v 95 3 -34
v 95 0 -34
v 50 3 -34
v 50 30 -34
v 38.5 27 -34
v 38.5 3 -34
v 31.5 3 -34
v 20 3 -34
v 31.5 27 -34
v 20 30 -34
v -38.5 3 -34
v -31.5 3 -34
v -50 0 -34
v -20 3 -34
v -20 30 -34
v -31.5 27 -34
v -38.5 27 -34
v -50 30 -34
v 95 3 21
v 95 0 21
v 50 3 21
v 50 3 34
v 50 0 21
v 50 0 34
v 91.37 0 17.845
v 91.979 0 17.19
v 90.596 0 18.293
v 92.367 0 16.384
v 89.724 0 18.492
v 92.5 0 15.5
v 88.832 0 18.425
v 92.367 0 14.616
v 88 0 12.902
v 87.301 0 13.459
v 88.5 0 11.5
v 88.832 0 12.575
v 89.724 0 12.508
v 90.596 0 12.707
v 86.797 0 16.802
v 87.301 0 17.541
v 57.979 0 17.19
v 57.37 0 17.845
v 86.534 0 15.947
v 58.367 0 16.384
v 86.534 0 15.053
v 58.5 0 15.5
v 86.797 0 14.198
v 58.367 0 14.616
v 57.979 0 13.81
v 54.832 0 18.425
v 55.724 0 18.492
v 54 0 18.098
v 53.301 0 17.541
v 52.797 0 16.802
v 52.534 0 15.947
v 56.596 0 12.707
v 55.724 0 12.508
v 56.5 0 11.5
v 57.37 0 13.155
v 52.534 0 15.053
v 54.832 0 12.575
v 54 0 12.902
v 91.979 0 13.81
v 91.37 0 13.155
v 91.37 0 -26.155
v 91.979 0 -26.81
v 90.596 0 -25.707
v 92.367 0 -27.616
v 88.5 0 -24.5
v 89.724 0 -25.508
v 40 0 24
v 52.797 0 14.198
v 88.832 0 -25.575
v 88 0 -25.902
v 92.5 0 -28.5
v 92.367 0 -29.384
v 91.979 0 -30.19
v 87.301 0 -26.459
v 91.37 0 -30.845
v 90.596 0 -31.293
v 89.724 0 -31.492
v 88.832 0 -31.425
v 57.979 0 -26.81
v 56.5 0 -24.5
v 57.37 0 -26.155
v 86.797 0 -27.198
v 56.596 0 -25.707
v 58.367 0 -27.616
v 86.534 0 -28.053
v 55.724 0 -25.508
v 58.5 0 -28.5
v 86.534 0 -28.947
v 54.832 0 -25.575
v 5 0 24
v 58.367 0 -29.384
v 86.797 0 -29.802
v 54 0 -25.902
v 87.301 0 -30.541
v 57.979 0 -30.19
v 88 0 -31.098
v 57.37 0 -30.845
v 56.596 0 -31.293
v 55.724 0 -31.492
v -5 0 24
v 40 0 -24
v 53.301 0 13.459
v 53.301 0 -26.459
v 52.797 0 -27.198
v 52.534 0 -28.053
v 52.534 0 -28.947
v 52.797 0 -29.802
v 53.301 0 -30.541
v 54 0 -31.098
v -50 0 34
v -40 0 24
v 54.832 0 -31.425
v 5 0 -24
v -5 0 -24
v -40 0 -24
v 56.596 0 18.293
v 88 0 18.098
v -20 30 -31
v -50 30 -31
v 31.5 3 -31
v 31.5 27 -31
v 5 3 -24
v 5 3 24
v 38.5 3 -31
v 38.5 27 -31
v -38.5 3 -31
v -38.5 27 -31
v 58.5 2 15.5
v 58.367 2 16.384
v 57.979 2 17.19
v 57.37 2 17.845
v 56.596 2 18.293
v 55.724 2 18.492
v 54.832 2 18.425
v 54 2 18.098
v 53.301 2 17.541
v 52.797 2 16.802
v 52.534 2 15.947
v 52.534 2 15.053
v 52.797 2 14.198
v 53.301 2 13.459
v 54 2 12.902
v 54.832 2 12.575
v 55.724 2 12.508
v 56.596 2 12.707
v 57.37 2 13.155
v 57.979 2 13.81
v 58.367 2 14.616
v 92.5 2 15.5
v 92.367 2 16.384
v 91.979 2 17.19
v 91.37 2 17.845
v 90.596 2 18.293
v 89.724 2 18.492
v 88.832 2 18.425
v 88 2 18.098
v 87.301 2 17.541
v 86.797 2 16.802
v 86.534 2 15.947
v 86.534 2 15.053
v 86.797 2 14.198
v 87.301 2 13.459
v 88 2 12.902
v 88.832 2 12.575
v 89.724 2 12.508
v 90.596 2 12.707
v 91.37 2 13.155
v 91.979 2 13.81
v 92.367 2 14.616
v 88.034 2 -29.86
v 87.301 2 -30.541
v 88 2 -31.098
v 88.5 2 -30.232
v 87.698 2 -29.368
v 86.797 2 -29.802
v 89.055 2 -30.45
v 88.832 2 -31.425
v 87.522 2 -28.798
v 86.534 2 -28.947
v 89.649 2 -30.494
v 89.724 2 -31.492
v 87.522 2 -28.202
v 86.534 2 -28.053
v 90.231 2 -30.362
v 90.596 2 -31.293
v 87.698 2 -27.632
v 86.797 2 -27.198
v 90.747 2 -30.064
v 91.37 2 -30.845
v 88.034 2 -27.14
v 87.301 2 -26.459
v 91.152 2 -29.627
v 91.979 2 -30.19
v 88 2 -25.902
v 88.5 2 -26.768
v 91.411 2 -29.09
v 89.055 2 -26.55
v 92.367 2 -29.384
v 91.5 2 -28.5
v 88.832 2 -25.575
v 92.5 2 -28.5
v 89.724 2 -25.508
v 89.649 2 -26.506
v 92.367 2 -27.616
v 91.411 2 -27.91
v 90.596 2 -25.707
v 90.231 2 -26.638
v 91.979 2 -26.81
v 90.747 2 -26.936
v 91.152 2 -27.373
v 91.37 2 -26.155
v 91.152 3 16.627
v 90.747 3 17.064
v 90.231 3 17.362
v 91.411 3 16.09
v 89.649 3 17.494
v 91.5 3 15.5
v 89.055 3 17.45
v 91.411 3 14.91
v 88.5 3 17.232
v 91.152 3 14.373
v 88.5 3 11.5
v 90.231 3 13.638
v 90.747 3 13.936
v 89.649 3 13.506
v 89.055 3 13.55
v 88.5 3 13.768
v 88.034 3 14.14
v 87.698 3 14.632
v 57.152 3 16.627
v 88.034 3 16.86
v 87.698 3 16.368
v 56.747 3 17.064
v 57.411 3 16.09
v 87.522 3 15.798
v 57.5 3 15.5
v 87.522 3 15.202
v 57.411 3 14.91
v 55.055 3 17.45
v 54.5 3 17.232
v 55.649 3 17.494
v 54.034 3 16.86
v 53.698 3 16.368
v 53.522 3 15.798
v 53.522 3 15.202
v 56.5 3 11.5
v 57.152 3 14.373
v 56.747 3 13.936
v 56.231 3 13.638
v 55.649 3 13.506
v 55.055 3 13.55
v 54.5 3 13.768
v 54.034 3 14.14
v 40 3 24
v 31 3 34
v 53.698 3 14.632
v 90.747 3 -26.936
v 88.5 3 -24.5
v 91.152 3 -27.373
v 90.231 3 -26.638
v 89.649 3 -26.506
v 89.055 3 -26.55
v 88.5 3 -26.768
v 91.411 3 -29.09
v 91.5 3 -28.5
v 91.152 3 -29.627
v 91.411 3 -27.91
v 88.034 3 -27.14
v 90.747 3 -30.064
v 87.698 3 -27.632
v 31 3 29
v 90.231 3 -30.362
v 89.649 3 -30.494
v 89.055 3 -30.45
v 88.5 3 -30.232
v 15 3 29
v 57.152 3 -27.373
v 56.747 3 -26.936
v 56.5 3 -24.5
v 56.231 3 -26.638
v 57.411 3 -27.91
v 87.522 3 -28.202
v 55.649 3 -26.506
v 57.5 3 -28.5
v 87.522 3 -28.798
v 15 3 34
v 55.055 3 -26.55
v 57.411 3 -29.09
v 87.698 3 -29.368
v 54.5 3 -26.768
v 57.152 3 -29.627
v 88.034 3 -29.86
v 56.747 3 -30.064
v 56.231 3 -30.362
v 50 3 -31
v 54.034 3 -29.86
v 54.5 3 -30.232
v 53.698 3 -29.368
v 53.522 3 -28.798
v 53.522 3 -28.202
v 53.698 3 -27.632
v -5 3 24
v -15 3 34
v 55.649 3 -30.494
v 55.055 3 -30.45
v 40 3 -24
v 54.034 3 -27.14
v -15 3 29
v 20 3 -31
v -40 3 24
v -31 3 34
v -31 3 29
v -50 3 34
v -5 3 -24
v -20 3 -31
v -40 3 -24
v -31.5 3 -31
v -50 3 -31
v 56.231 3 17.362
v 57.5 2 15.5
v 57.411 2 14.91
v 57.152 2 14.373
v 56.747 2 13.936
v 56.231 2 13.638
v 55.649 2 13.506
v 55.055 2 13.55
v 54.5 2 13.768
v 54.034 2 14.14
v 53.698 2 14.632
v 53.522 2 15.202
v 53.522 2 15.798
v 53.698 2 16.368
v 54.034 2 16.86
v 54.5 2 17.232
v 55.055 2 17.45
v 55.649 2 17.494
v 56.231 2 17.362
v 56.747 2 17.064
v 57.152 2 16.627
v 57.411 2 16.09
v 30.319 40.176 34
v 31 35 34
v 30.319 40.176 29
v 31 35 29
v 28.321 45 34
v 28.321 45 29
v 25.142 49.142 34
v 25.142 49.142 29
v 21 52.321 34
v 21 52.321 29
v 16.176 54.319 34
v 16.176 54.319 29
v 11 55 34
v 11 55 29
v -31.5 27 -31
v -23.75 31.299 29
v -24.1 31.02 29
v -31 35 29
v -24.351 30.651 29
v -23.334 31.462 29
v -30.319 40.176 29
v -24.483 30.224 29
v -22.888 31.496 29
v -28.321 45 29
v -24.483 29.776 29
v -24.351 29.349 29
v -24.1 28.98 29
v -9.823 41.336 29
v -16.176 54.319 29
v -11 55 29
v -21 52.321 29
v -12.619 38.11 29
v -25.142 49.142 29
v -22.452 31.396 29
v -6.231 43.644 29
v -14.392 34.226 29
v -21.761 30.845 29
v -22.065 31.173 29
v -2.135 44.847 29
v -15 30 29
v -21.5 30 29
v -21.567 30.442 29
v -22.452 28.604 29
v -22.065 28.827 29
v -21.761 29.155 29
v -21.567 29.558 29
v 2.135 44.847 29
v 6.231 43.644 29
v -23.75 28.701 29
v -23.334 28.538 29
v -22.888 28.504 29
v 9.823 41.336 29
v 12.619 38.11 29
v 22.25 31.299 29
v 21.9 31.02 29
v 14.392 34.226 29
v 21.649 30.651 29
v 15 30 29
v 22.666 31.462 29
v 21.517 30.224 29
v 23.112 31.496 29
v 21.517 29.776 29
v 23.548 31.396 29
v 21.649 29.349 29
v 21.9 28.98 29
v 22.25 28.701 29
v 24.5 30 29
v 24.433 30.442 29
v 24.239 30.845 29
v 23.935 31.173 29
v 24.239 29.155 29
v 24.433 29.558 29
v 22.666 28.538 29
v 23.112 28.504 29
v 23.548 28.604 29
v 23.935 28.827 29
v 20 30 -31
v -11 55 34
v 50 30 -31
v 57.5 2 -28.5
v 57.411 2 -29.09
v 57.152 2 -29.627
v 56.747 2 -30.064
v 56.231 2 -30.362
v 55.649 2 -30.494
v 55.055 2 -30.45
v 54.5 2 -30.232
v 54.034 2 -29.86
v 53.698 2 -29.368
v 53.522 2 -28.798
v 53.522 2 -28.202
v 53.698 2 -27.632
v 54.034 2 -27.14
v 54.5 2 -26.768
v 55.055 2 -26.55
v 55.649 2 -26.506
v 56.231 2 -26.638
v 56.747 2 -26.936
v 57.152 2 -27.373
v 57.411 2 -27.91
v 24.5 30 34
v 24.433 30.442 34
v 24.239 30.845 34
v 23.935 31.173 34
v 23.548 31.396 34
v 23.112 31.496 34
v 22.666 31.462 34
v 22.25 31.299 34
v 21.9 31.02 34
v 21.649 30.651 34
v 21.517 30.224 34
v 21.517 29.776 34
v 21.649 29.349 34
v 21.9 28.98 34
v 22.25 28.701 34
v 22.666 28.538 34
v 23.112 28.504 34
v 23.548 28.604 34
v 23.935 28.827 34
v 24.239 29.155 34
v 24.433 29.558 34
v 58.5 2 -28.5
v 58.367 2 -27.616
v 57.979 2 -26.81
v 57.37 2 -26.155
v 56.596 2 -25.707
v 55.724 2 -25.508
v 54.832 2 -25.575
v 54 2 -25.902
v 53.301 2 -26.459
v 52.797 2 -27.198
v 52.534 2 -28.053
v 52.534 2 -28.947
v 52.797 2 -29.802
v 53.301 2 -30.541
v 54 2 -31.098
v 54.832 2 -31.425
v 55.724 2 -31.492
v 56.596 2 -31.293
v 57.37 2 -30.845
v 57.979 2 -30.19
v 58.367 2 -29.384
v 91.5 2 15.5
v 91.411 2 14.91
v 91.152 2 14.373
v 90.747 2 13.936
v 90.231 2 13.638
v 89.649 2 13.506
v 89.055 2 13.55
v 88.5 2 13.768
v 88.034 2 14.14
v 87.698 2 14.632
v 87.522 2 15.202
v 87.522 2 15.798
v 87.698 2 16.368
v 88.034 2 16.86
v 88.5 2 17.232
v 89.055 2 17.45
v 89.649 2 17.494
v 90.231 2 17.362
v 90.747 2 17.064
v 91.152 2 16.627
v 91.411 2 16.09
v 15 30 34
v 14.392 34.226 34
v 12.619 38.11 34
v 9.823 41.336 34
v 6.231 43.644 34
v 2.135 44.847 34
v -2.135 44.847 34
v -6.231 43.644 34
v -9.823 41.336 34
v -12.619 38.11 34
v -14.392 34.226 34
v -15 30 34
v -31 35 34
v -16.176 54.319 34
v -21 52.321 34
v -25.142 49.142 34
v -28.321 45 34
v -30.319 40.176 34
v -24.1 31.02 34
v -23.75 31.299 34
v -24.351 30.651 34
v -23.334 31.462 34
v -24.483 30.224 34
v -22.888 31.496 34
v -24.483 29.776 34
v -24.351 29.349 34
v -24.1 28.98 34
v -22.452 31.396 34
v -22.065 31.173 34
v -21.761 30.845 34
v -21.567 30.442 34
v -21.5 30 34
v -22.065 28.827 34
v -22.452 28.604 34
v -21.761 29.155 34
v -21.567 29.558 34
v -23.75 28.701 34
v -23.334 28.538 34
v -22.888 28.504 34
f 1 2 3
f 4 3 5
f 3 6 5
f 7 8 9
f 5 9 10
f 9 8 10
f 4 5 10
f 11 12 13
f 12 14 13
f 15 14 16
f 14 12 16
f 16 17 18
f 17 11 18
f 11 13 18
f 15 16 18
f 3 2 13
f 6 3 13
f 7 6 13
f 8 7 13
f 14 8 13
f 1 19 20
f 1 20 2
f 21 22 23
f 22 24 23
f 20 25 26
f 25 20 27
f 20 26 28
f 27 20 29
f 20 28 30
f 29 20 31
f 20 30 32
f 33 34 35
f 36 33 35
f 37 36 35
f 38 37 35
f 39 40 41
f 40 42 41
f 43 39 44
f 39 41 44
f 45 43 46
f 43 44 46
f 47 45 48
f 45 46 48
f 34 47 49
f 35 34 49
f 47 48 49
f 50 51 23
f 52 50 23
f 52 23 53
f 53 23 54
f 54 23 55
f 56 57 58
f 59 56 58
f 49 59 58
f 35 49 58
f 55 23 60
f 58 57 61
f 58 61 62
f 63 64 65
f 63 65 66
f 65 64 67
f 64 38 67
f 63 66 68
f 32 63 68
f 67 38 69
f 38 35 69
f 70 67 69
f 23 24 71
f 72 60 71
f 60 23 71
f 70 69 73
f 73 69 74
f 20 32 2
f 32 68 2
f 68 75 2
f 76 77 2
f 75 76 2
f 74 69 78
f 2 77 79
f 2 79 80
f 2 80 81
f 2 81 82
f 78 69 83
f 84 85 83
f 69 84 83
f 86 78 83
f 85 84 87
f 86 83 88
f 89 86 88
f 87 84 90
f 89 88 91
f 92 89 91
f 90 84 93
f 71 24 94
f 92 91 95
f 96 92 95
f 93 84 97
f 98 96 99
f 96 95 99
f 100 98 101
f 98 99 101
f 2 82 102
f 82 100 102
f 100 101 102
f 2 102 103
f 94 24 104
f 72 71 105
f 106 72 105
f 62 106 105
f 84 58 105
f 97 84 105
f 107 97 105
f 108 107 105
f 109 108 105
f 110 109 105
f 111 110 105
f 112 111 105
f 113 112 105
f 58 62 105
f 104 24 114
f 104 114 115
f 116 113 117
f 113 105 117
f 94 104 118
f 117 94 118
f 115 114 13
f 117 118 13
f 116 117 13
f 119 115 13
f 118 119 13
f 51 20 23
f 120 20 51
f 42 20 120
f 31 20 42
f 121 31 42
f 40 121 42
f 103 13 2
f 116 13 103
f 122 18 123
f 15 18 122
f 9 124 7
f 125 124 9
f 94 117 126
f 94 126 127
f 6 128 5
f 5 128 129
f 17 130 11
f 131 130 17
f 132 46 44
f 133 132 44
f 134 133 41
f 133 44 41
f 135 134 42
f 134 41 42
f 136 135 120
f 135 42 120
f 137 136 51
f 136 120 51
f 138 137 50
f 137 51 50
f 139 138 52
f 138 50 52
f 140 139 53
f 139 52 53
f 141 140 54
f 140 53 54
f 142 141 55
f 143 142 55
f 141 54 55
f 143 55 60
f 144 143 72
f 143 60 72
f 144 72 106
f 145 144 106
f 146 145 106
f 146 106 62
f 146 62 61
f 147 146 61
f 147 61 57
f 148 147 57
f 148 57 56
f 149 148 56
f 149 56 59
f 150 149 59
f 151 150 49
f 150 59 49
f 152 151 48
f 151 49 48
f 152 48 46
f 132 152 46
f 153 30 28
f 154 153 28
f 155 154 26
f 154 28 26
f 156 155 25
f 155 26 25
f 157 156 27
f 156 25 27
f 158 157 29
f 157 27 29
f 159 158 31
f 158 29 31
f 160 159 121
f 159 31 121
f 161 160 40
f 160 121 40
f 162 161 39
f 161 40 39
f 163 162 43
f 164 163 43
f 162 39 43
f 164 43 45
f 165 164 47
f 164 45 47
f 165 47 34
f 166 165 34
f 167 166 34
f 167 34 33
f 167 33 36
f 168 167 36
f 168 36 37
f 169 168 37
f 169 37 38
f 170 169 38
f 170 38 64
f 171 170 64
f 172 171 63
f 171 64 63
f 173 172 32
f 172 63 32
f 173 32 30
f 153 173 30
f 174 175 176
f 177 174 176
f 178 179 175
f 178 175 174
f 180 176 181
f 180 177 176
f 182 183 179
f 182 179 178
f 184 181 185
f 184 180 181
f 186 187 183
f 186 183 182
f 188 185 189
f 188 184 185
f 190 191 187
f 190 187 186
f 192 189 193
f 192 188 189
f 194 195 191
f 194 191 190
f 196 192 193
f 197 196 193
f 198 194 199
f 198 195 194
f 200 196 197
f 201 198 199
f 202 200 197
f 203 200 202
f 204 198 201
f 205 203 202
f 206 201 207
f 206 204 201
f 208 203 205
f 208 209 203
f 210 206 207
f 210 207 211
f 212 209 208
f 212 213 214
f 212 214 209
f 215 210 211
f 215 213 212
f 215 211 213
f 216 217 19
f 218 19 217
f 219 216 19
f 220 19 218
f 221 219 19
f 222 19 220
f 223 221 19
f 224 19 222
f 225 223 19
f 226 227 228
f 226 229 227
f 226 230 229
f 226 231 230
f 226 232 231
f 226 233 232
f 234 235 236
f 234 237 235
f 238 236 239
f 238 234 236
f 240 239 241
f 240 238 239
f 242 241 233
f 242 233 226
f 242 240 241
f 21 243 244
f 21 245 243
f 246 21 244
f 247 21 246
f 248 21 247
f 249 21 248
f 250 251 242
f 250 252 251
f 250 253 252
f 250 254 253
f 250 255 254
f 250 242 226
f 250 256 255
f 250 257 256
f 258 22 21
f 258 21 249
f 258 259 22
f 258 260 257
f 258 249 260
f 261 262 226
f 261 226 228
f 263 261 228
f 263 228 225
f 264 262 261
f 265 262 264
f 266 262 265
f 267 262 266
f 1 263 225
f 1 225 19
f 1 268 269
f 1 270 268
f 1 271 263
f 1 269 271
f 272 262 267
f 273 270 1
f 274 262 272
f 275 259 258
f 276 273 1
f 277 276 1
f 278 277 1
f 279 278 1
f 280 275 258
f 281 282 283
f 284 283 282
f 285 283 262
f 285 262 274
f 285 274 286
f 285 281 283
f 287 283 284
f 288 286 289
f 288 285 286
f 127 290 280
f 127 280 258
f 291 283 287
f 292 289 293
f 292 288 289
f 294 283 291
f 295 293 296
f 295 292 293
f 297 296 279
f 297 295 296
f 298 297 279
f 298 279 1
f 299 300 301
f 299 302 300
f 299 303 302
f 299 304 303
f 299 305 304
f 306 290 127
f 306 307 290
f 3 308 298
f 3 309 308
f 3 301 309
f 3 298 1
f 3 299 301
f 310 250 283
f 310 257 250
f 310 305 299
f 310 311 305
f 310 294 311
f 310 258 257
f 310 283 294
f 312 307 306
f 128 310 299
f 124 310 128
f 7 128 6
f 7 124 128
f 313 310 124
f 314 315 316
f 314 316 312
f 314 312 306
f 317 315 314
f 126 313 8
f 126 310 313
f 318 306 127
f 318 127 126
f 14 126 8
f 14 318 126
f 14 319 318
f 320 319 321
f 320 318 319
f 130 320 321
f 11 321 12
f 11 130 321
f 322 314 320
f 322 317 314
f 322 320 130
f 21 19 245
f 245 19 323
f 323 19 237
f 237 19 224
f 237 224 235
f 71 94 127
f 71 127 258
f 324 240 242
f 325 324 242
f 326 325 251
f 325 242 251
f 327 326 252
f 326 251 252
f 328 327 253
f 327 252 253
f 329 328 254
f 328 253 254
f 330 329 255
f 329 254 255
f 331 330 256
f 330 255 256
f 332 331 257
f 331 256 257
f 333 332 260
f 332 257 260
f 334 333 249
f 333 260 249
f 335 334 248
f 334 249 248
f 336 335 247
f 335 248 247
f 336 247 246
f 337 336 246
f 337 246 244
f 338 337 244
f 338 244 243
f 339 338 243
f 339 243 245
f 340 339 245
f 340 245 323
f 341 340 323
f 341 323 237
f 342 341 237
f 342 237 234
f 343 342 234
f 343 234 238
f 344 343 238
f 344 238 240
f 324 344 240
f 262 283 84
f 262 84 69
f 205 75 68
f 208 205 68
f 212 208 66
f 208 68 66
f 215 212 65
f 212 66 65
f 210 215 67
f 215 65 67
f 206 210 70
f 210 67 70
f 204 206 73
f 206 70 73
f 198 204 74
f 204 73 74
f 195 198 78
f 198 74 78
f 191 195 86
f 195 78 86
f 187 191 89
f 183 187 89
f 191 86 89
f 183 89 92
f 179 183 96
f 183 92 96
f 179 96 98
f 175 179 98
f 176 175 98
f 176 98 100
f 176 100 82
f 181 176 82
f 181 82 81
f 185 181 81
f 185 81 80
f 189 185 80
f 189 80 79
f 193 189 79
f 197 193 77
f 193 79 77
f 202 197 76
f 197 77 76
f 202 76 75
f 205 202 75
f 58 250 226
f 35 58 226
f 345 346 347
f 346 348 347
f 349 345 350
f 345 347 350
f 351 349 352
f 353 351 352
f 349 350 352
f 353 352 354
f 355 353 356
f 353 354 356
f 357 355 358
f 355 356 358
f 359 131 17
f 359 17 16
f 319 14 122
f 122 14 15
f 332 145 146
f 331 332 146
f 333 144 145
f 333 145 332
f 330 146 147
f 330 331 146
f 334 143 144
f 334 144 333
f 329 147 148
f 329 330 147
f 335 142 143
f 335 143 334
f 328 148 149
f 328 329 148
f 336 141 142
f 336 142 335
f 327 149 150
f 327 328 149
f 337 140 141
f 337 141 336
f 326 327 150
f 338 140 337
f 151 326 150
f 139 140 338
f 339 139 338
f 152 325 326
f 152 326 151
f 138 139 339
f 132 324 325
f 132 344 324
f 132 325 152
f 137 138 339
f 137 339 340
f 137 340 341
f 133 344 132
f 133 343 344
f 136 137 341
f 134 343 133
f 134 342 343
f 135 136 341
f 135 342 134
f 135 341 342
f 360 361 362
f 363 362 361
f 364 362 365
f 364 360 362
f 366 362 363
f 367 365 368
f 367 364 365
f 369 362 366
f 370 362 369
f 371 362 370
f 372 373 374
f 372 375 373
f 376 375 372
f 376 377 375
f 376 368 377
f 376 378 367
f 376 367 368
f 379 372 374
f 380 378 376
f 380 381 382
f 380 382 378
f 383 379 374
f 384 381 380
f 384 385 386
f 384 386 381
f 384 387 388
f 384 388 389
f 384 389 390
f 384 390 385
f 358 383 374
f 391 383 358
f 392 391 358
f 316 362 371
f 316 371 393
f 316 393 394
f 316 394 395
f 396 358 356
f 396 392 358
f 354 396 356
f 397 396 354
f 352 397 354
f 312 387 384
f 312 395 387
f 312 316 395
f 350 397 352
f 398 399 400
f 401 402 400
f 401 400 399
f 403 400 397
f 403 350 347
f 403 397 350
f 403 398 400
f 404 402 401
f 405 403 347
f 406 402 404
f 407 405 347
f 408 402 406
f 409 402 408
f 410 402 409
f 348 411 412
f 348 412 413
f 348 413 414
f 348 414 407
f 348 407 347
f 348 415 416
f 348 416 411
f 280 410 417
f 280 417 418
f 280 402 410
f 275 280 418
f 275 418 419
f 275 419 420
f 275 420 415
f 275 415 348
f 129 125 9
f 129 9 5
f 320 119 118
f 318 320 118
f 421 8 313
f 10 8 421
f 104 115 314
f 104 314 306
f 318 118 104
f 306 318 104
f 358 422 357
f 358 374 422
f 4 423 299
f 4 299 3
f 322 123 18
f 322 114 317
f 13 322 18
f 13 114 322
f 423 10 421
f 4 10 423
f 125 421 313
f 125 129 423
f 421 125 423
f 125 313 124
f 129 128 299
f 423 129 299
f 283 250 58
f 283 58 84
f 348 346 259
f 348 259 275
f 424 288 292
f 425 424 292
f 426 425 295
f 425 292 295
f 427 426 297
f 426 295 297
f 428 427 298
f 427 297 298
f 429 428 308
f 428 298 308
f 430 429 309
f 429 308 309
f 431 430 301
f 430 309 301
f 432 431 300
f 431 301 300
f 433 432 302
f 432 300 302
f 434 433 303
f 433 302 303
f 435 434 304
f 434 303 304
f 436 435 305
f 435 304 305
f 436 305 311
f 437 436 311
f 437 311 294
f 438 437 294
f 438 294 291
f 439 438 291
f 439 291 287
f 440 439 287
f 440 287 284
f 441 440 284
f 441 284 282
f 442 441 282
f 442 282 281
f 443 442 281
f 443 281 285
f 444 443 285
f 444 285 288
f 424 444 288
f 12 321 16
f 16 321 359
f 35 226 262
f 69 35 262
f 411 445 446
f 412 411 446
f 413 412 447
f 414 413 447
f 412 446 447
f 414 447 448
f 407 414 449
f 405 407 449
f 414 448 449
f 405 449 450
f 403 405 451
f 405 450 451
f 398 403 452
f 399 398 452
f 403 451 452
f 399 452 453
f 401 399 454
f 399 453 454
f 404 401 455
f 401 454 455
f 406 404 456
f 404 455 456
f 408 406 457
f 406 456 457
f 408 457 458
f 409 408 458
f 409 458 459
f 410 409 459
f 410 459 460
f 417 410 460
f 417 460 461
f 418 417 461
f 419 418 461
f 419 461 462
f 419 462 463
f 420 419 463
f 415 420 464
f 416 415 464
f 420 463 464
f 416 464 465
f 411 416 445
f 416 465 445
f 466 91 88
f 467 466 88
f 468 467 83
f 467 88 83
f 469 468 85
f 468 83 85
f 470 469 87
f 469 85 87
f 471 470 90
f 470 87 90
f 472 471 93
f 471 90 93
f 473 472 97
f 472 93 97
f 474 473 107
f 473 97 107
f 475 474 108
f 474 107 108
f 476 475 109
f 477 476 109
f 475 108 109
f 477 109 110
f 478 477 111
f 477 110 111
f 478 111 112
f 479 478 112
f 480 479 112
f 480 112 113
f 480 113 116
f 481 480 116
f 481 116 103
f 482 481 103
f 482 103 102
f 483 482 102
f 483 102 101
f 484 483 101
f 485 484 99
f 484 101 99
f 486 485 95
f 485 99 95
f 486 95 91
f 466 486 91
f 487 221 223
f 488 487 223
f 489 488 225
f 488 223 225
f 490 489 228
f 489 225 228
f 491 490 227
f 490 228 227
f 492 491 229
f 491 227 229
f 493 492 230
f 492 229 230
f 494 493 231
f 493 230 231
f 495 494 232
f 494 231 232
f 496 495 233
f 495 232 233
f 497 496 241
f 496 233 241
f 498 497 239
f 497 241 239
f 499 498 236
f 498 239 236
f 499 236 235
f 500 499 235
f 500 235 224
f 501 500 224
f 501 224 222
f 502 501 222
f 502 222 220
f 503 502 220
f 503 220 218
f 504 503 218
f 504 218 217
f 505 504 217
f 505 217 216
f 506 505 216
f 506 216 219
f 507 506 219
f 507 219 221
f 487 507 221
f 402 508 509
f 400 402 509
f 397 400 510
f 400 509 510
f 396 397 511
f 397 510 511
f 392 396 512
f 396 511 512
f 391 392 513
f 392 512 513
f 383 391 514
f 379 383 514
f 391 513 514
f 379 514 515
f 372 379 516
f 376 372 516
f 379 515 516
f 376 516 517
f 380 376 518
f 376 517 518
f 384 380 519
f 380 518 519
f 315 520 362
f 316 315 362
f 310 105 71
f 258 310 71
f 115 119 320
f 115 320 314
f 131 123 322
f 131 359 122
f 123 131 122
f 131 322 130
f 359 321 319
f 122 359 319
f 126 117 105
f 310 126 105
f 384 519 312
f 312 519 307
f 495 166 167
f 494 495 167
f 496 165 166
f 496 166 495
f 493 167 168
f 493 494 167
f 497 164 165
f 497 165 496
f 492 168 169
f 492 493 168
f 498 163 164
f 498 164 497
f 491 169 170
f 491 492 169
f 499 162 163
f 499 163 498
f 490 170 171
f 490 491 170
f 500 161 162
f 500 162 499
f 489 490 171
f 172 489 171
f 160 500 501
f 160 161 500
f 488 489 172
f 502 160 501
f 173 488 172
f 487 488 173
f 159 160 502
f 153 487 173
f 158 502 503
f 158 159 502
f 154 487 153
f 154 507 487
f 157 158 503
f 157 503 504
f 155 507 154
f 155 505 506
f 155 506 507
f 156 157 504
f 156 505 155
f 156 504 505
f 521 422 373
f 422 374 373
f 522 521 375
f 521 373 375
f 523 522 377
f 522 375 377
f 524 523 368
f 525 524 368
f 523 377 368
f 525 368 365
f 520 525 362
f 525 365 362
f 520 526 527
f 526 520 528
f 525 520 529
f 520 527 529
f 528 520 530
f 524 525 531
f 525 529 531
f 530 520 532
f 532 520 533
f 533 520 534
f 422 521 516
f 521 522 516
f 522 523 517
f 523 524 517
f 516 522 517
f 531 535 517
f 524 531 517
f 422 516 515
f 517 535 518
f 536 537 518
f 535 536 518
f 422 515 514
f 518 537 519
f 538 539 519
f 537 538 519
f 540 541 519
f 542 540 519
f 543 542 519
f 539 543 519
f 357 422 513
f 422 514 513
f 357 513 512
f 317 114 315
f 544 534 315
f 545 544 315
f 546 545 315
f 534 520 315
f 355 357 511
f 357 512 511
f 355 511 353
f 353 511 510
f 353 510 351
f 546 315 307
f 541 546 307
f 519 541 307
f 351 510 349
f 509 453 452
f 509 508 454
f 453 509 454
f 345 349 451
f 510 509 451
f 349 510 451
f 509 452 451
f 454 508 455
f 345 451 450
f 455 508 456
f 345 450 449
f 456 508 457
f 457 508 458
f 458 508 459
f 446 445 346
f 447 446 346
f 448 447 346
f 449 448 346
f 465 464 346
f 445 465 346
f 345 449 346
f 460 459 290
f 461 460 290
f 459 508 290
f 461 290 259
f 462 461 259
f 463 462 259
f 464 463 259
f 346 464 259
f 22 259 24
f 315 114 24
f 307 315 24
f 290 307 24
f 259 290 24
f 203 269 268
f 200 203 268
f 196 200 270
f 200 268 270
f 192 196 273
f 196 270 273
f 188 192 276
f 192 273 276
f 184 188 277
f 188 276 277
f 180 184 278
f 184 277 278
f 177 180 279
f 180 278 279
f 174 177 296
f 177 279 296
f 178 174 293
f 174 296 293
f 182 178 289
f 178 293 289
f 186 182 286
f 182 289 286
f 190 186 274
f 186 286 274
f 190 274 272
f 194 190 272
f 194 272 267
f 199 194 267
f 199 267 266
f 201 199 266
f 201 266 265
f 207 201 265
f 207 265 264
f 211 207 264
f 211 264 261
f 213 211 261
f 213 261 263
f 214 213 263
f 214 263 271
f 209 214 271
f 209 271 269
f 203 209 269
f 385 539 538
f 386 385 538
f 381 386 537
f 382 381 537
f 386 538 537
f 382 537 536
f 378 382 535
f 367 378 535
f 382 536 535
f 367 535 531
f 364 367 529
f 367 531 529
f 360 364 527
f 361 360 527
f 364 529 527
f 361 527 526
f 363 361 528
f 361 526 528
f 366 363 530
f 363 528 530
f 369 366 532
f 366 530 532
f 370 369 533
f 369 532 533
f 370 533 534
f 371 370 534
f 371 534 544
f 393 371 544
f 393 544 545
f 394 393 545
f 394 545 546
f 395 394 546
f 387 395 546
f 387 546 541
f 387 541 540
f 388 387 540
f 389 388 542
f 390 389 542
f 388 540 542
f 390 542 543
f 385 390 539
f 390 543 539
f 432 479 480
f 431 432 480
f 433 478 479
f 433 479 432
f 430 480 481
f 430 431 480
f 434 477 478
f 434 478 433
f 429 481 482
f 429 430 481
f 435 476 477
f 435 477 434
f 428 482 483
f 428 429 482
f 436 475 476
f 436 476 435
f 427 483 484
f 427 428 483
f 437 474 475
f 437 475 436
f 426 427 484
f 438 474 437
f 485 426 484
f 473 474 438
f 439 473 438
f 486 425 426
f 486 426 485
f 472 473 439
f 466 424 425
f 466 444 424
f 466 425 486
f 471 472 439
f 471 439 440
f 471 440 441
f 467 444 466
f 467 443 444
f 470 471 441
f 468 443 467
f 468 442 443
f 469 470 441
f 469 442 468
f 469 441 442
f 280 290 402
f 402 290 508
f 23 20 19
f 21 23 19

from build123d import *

# Parameters (mm, degrees)
SKETCH_1_W          = 100
SKETCH_1_H          = 68
EXTRUDE_1_DEPTH     = 3
SKETCH_2_W          = 100
SKETCH_2_H          = 3
EXTRUDE_2_DEPTH     = 27
SKETCH_3_W          = 7
SKETCH_3_H          = 24
CUT_EXTRUDE_2_DEPTH = 27
SKETCH_4_W          = 62
SKETCH_4_H          = 5
EXTRUDE_3_DEPTH     = 52
SKETCH_5_R          = 1.5
CUT_EXTRUDE_4_DEPTH = 5
SKETCH_7_W          = 35
SKETCH_7_H          = 48
CUT_EXTRUDE_5_DEPTH = 3
SKETCH_8_W          = 55
SKETCH_8_H          = 3
EXTRUDE_4_DEPTH     = 45
SKETCH_10_R         = 2
SKETCH_10_W         = 32
SKETCH_10_H         = 36
CUT_EXTRUDE_6_DEPTH = 45
SKETCH_12_R         = 3
CUT_EXTRUDE_7_DEPTH = 2
SKETCH_13_W         = 40
SKETCH_13_H         = 27
CUT_EXTRUDE_8_DEPTH = 10
FILLET_1_R          = 20


with BuildPart() as part:
    # 스케치1 → 보스-돌출1 (new body)
    with BuildSketch(Plane(origin=(0, 0, 0), x_dir=(1, 0, 0), z_dir=(0, 1, 0))):
        Rectangle(SKETCH_1_W, SKETCH_1_H)
    extrude(amount=EXTRUDE_1_DEPTH)

    # 스케치2 → 보스-돌출2 (add)
    with BuildSketch(Plane(origin=(0, 3, 0), x_dir=(1, 0, 0), z_dir=(0, 1, 0))):
        with Locations((0, 32.5)):
            Rectangle(SKETCH_2_W, SKETCH_2_H)
    extrude(amount=EXTRUDE_2_DEPTH)

    # 스케치3 → 컷-돌출2 (cut)
    with BuildSketch(Plane.XY.offset(-31)):
        with Locations((-35, 15)):
            Rectangle(SKETCH_3_W, SKETCH_3_H)
        with Locations((35, 15)):
            Rectangle(SKETCH_3_W, SKETCH_3_H)
    extrude(amount=-CUT_EXTRUDE_2_DEPTH, mode=Mode.SUBTRACT)

    # 스케치4 → 보스-돌출3 (add)
    with BuildSketch(Plane(origin=(0, 3, 0), x_dir=(1, 0, 0), z_dir=(0, 1, 0))):
        with Locations((0, -31.5)):
            Rectangle(SKETCH_4_W, SKETCH_4_H)
    extrude(amount=EXTRUDE_3_DEPTH)

    # 스케치5 → 컷-돌출4 (cut)
    with BuildSketch(Plane.XY.offset(34)):
        with Locations((-23, 30)):
            Circle(SKETCH_5_R)
        with Locations((23, 30)):
            Circle(SKETCH_5_R)
        with BuildLine():
            Line((-15, 30), (-15, 3))
            Line((-15, 3), (15, 3))
            Line((15, 3), (15, 30))
            ThreePointArc((15, 30), (0, 45), (-15, 30))
        make_face()
    extrude(amount=-CUT_EXTRUDE_4_DEPTH, mode=Mode.SUBTRACT)

    # 스케치7 → 컷-돌출5 (cut)
    with BuildSketch(Plane.XZ):
        with Locations((22.5, 0)):
            Rectangle(SKETCH_7_W, SKETCH_7_H)
        with Locations((-22.5, 0)):
            Rectangle(SKETCH_7_W, SKETCH_7_H)
    extrude(amount=-CUT_EXTRUDE_5_DEPTH, mode=Mode.SUBTRACT)

    # 스케치8 → 보스-돌출4 (add)
    with BuildSketch(Plane(origin=(50, 0, 0), x_dir=(0, 0, -1), z_dir=(1, 0, 0))):
        with Locations((6.5, 1.5)):
            Rectangle(SKETCH_8_W, SKETCH_8_H)
    extrude(amount=EXTRUDE_4_DEPTH)

    # 스케치10 → 컷-돌출6 (cut)
    with BuildSketch(Plane(origin=(0, 3, 0), x_dir=(1, 0, 0), z_dir=(0, 1, 0))):
        with Locations((55.5, -15.5)):
            Circle(SKETCH_10_R)
        with Locations((55.5, 28.5)):
            Circle(SKETCH_10_R)
        with Locations((89.5, 28.5)):
            Circle(SKETCH_10_R)
        with Locations((89.5, -15.5)):
            Circle(SKETCH_10_R)
        with Locations((72.5, 6.5)):
            Rectangle(SKETCH_10_W, SKETCH_10_H)
    extrude(amount=-CUT_EXTRUDE_6_DEPTH, mode=Mode.SUBTRACT)

    # 스케치12 → 컷-돌출7 (cut)
    with BuildSketch(Plane.XZ):
        with Locations((89.5, -28.5)):
            Circle(SKETCH_12_R)
        with Locations((89.5, 15.5)):
            Circle(SKETCH_12_R)
        with Locations((55.5, 15.5)):
            Circle(SKETCH_12_R)
        with Locations((55.5, -28.5)):
            Circle(SKETCH_12_R)
    extrude(amount=-CUT_EXTRUDE_7_DEPTH, mode=Mode.SUBTRACT)

    # 스케치13 → 컷-돌출8 (cut)
    with BuildSketch(Plane(origin=(0, 0, -34), x_dir=(-1, 0, 0), z_dir=(0, 0, -1))):
        with Locations((0, 16.5)):
            Rectangle(SKETCH_13_W, SKETCH_13_H)
    extrude(amount=-CUT_EXTRUDE_8_DEPTH, mode=Mode.SUBTRACT)

    # 필렛1
    fillet_1_edges = [part.edges().sort_by_distance(p)[0] for p in [
        (31, 55, 31.5),
        (-31, 55, 31.5),
    ]]
    fillet(fillet_1_edges, radius=FILLET_1_R)


solid = part.part
